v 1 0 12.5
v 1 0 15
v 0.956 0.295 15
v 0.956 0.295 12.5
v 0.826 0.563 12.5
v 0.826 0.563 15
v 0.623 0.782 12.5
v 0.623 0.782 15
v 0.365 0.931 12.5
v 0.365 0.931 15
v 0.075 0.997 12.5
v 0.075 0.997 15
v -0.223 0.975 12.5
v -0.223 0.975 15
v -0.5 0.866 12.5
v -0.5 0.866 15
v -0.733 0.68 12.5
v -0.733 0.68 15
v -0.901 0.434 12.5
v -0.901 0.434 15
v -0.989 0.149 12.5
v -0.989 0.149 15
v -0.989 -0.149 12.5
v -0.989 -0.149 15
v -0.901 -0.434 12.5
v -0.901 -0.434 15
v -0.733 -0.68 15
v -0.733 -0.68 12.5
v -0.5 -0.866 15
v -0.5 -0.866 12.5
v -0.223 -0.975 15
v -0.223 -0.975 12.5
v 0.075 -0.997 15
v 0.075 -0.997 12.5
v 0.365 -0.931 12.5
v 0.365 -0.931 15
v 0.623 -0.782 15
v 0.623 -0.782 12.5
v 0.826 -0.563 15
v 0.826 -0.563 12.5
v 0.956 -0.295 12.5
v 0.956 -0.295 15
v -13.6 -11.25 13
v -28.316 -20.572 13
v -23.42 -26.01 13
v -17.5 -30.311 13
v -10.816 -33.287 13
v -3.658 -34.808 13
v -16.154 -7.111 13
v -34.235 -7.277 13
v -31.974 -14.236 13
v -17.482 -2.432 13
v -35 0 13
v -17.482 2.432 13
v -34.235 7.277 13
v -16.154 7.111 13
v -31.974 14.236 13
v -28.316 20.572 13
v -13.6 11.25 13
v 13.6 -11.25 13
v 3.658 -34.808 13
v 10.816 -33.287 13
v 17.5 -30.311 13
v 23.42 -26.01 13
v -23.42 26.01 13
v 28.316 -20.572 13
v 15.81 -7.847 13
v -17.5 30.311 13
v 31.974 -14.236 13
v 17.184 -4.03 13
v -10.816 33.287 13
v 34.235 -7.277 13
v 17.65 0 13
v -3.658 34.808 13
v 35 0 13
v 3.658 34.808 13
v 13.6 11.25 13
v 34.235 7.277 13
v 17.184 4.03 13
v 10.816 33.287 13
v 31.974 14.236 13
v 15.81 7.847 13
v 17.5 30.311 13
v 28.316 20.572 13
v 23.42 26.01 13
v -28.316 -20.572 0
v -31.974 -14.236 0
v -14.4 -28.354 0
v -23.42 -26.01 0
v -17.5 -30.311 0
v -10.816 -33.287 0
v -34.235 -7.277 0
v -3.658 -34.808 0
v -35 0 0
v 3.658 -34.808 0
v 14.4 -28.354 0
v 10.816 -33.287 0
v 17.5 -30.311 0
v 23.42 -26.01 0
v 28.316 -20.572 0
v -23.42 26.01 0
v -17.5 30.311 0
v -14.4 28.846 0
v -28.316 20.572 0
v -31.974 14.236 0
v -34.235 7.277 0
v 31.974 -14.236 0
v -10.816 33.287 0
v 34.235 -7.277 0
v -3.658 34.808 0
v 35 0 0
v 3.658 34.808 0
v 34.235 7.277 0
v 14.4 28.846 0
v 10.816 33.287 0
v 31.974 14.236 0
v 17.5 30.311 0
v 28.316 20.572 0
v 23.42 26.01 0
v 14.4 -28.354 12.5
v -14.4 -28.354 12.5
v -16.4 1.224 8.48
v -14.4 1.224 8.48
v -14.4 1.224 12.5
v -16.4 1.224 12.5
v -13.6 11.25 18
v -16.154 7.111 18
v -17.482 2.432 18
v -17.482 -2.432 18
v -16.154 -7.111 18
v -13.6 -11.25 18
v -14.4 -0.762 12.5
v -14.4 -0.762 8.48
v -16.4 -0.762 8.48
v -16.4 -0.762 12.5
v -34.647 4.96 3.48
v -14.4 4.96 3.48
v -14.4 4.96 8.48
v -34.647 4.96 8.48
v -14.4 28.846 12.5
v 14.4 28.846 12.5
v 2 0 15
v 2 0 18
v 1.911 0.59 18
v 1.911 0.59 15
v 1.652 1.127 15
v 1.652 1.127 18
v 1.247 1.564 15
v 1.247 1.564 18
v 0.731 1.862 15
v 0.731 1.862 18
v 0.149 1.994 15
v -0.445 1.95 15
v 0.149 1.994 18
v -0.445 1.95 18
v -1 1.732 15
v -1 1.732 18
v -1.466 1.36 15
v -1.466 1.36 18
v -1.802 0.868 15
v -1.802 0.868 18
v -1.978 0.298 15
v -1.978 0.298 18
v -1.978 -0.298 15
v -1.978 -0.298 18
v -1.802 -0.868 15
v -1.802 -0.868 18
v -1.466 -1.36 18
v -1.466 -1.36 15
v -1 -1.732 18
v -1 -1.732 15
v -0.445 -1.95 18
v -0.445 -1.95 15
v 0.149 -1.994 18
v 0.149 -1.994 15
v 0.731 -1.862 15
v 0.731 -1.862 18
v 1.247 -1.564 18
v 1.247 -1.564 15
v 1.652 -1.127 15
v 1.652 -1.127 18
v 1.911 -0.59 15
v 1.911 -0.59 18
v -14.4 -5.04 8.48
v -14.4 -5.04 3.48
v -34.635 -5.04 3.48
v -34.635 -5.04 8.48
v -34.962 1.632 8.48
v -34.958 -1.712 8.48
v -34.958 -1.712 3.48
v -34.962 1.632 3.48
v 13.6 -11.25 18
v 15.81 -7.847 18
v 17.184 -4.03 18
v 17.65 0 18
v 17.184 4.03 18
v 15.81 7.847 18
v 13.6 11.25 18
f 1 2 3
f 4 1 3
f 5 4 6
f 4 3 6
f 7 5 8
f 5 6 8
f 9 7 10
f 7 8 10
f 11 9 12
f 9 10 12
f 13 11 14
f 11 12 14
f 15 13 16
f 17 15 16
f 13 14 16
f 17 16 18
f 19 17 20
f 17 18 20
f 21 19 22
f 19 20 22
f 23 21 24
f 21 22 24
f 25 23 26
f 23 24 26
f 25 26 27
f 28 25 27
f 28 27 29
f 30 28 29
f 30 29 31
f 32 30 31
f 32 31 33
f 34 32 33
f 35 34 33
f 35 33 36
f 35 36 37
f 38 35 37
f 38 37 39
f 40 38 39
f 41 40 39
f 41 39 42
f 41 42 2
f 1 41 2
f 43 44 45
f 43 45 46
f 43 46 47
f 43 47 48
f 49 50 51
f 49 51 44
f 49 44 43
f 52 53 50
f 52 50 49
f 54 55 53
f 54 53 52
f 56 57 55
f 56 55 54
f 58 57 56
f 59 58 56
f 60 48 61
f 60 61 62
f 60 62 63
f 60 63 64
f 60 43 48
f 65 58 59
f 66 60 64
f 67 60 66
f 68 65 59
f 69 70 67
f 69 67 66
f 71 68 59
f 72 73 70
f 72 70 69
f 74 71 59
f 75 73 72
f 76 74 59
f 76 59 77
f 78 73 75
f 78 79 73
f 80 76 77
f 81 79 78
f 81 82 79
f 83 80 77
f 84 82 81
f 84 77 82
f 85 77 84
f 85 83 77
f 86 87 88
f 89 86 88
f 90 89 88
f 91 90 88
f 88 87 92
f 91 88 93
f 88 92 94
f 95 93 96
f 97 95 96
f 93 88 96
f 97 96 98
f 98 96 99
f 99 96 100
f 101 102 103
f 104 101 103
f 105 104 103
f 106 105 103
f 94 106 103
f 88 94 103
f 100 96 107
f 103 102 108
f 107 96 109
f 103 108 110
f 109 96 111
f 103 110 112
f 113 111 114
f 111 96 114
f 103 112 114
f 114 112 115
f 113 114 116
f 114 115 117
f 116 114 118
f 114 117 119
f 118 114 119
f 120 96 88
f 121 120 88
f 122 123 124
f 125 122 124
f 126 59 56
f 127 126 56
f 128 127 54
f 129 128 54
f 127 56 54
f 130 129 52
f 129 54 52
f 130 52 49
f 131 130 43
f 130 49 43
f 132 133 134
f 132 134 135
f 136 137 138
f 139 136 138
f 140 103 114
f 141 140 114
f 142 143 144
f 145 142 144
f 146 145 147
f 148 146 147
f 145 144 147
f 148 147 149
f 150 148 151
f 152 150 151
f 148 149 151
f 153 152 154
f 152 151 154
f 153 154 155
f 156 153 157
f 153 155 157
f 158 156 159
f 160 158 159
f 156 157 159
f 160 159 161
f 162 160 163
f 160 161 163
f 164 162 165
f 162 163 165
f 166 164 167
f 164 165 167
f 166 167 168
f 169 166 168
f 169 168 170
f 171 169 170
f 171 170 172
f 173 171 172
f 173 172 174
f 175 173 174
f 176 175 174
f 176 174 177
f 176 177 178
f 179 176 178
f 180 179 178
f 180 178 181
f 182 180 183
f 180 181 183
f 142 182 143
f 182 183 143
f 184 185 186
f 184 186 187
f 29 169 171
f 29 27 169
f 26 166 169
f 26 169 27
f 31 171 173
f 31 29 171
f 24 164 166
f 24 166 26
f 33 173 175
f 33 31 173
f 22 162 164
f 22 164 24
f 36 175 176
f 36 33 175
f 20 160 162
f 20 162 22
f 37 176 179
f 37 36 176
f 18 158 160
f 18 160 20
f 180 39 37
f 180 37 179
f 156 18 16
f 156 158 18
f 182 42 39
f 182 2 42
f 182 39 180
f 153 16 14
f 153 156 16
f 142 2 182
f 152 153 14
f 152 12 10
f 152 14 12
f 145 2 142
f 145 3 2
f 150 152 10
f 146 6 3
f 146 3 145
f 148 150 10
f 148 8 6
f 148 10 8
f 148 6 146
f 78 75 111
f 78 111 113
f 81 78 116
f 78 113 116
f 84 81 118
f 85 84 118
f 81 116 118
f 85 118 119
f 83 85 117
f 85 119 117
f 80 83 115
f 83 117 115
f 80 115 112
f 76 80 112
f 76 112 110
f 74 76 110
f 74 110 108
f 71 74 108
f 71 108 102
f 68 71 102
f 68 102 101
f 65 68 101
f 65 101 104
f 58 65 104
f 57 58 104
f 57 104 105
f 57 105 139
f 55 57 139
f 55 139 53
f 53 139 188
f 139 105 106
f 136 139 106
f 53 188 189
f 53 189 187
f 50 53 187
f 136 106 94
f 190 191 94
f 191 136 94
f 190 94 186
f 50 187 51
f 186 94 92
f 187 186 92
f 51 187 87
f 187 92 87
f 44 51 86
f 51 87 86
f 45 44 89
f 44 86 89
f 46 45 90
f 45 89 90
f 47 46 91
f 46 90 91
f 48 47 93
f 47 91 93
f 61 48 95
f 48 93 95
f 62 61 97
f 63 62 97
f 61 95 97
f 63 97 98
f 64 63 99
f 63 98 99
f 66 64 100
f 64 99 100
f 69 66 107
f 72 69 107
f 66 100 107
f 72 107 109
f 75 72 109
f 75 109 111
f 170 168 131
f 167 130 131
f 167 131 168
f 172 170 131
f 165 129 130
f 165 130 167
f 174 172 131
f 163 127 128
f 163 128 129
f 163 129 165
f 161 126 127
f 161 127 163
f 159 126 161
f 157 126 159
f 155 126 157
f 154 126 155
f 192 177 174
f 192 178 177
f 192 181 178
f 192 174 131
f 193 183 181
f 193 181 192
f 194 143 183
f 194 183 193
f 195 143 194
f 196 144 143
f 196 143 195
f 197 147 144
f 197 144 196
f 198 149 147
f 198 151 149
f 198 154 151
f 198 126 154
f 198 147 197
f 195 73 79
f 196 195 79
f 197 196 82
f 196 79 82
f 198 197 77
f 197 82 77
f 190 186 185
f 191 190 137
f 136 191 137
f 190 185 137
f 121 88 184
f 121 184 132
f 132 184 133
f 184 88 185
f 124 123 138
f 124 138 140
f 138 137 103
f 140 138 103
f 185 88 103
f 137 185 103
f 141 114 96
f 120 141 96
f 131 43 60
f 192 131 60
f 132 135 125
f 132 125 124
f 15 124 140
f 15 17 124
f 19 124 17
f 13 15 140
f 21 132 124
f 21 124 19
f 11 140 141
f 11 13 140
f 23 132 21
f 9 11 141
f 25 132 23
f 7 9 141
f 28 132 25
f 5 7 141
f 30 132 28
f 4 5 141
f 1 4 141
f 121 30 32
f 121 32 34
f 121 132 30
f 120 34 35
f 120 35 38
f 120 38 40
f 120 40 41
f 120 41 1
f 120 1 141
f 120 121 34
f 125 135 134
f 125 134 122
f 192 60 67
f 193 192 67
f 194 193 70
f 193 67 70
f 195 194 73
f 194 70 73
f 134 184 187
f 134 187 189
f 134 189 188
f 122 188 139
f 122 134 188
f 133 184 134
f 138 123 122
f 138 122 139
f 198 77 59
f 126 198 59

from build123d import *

# Parameters (mm, degrees)
F0_R      = 35
F1_DEPTH  = 13
F3_DEPTH  = 12.5
F5_DEPTH  = 5
F6_R      = 2
F7_DEPTH  = 3
F8_R      = 1
F9_DEPTH  = 25
F10_W     = 10
F10_H     = 5
F11_DEPTH = 25
F12_W     = 1.986437419
F12_H     = 4.0204126202
F13_DEPTH = 2


with BuildPart() as f1:
    # F0 (on Top) → F1 (new body)
    with BuildSketch(Plane.XY):
        Circle(F0_R)
    extrude(amount=F1_DEPTH)

    # F2 (on face) → F3 (cut)
    with BuildSketch(Plane(origin=(0, 0, 0), x_dir=(1, 0, 0), z_dir=(0, 0, -1))):
        Polygon((14.4, 28.3542412236), (-14.4, 28.3542412236), (-14.4, 0), (0, 0), (14.4, 0), align=None)
        Polygon((0, 0), (-14.4, 0), (-14.4, -28.8457587764), (14.4, -28.8457587764), (14.4, 0), align=None)
    extrude(amount=-F3_DEPTH, mode=Mode.SUBTRACT)

    # F4 (on face) → F5 (join)
    with BuildSketch(Plane.XY.offset(13)):
        with BuildLine():
            ThreePointArc((13.6, -11.25), (16.6066628195, -5.978398615), (17.65, 0))
            ThreePointArc((17.65, 0), (16.6066628195, 5.978398615), (13.6, 11.25))
            Line((13.6, 11.25), (-13.6, 11.25))
            ThreePointArc((-13.6, 11.25), (-17.65, 0), (-13.6, -11.25))
            Line((-13.6, -11.25), (0, -11.25))
            Line((0, -11.25), (13.6, -11.25))
        make_face()
    extrude(amount=F5_DEPTH)

    # F6 (on face) → F7 (cut)
    with BuildSketch(Plane.XY.offset(18)):
        Circle(F6_R)
    extrude(amount=-F7_DEPTH, mode=Mode.SUBTRACT)

    # F8 (on face) → F9 (cut)
    with BuildSketch(Plane.XY.offset(15)):
        Circle(F8_R)
    extrude(amount=-F9_DEPTH, mode=Mode.SUBTRACT)

    # F10 (on face) → F11 (cut)
    with BuildSketch(Plane.YZ.offset(-14.4)):
        with Locations((-0.0396446604, 5.9795873798)):
            Rectangle(F10_W, F10_H)
    extrude(amount=-F11_DEPTH, mode=Mode.SUBTRACT)

    # F12 (on face) → F13 (cut)
    with BuildSketch(Plane.YZ.offset(-14.4)):
        with Locations((0.2311340359, 10.4897936899)):
            Rectangle(F12_W, F12_H)
    extrude(amount=-F13_DEPTH, mode=Mode.SUBTRACT)


solid = f1.part
